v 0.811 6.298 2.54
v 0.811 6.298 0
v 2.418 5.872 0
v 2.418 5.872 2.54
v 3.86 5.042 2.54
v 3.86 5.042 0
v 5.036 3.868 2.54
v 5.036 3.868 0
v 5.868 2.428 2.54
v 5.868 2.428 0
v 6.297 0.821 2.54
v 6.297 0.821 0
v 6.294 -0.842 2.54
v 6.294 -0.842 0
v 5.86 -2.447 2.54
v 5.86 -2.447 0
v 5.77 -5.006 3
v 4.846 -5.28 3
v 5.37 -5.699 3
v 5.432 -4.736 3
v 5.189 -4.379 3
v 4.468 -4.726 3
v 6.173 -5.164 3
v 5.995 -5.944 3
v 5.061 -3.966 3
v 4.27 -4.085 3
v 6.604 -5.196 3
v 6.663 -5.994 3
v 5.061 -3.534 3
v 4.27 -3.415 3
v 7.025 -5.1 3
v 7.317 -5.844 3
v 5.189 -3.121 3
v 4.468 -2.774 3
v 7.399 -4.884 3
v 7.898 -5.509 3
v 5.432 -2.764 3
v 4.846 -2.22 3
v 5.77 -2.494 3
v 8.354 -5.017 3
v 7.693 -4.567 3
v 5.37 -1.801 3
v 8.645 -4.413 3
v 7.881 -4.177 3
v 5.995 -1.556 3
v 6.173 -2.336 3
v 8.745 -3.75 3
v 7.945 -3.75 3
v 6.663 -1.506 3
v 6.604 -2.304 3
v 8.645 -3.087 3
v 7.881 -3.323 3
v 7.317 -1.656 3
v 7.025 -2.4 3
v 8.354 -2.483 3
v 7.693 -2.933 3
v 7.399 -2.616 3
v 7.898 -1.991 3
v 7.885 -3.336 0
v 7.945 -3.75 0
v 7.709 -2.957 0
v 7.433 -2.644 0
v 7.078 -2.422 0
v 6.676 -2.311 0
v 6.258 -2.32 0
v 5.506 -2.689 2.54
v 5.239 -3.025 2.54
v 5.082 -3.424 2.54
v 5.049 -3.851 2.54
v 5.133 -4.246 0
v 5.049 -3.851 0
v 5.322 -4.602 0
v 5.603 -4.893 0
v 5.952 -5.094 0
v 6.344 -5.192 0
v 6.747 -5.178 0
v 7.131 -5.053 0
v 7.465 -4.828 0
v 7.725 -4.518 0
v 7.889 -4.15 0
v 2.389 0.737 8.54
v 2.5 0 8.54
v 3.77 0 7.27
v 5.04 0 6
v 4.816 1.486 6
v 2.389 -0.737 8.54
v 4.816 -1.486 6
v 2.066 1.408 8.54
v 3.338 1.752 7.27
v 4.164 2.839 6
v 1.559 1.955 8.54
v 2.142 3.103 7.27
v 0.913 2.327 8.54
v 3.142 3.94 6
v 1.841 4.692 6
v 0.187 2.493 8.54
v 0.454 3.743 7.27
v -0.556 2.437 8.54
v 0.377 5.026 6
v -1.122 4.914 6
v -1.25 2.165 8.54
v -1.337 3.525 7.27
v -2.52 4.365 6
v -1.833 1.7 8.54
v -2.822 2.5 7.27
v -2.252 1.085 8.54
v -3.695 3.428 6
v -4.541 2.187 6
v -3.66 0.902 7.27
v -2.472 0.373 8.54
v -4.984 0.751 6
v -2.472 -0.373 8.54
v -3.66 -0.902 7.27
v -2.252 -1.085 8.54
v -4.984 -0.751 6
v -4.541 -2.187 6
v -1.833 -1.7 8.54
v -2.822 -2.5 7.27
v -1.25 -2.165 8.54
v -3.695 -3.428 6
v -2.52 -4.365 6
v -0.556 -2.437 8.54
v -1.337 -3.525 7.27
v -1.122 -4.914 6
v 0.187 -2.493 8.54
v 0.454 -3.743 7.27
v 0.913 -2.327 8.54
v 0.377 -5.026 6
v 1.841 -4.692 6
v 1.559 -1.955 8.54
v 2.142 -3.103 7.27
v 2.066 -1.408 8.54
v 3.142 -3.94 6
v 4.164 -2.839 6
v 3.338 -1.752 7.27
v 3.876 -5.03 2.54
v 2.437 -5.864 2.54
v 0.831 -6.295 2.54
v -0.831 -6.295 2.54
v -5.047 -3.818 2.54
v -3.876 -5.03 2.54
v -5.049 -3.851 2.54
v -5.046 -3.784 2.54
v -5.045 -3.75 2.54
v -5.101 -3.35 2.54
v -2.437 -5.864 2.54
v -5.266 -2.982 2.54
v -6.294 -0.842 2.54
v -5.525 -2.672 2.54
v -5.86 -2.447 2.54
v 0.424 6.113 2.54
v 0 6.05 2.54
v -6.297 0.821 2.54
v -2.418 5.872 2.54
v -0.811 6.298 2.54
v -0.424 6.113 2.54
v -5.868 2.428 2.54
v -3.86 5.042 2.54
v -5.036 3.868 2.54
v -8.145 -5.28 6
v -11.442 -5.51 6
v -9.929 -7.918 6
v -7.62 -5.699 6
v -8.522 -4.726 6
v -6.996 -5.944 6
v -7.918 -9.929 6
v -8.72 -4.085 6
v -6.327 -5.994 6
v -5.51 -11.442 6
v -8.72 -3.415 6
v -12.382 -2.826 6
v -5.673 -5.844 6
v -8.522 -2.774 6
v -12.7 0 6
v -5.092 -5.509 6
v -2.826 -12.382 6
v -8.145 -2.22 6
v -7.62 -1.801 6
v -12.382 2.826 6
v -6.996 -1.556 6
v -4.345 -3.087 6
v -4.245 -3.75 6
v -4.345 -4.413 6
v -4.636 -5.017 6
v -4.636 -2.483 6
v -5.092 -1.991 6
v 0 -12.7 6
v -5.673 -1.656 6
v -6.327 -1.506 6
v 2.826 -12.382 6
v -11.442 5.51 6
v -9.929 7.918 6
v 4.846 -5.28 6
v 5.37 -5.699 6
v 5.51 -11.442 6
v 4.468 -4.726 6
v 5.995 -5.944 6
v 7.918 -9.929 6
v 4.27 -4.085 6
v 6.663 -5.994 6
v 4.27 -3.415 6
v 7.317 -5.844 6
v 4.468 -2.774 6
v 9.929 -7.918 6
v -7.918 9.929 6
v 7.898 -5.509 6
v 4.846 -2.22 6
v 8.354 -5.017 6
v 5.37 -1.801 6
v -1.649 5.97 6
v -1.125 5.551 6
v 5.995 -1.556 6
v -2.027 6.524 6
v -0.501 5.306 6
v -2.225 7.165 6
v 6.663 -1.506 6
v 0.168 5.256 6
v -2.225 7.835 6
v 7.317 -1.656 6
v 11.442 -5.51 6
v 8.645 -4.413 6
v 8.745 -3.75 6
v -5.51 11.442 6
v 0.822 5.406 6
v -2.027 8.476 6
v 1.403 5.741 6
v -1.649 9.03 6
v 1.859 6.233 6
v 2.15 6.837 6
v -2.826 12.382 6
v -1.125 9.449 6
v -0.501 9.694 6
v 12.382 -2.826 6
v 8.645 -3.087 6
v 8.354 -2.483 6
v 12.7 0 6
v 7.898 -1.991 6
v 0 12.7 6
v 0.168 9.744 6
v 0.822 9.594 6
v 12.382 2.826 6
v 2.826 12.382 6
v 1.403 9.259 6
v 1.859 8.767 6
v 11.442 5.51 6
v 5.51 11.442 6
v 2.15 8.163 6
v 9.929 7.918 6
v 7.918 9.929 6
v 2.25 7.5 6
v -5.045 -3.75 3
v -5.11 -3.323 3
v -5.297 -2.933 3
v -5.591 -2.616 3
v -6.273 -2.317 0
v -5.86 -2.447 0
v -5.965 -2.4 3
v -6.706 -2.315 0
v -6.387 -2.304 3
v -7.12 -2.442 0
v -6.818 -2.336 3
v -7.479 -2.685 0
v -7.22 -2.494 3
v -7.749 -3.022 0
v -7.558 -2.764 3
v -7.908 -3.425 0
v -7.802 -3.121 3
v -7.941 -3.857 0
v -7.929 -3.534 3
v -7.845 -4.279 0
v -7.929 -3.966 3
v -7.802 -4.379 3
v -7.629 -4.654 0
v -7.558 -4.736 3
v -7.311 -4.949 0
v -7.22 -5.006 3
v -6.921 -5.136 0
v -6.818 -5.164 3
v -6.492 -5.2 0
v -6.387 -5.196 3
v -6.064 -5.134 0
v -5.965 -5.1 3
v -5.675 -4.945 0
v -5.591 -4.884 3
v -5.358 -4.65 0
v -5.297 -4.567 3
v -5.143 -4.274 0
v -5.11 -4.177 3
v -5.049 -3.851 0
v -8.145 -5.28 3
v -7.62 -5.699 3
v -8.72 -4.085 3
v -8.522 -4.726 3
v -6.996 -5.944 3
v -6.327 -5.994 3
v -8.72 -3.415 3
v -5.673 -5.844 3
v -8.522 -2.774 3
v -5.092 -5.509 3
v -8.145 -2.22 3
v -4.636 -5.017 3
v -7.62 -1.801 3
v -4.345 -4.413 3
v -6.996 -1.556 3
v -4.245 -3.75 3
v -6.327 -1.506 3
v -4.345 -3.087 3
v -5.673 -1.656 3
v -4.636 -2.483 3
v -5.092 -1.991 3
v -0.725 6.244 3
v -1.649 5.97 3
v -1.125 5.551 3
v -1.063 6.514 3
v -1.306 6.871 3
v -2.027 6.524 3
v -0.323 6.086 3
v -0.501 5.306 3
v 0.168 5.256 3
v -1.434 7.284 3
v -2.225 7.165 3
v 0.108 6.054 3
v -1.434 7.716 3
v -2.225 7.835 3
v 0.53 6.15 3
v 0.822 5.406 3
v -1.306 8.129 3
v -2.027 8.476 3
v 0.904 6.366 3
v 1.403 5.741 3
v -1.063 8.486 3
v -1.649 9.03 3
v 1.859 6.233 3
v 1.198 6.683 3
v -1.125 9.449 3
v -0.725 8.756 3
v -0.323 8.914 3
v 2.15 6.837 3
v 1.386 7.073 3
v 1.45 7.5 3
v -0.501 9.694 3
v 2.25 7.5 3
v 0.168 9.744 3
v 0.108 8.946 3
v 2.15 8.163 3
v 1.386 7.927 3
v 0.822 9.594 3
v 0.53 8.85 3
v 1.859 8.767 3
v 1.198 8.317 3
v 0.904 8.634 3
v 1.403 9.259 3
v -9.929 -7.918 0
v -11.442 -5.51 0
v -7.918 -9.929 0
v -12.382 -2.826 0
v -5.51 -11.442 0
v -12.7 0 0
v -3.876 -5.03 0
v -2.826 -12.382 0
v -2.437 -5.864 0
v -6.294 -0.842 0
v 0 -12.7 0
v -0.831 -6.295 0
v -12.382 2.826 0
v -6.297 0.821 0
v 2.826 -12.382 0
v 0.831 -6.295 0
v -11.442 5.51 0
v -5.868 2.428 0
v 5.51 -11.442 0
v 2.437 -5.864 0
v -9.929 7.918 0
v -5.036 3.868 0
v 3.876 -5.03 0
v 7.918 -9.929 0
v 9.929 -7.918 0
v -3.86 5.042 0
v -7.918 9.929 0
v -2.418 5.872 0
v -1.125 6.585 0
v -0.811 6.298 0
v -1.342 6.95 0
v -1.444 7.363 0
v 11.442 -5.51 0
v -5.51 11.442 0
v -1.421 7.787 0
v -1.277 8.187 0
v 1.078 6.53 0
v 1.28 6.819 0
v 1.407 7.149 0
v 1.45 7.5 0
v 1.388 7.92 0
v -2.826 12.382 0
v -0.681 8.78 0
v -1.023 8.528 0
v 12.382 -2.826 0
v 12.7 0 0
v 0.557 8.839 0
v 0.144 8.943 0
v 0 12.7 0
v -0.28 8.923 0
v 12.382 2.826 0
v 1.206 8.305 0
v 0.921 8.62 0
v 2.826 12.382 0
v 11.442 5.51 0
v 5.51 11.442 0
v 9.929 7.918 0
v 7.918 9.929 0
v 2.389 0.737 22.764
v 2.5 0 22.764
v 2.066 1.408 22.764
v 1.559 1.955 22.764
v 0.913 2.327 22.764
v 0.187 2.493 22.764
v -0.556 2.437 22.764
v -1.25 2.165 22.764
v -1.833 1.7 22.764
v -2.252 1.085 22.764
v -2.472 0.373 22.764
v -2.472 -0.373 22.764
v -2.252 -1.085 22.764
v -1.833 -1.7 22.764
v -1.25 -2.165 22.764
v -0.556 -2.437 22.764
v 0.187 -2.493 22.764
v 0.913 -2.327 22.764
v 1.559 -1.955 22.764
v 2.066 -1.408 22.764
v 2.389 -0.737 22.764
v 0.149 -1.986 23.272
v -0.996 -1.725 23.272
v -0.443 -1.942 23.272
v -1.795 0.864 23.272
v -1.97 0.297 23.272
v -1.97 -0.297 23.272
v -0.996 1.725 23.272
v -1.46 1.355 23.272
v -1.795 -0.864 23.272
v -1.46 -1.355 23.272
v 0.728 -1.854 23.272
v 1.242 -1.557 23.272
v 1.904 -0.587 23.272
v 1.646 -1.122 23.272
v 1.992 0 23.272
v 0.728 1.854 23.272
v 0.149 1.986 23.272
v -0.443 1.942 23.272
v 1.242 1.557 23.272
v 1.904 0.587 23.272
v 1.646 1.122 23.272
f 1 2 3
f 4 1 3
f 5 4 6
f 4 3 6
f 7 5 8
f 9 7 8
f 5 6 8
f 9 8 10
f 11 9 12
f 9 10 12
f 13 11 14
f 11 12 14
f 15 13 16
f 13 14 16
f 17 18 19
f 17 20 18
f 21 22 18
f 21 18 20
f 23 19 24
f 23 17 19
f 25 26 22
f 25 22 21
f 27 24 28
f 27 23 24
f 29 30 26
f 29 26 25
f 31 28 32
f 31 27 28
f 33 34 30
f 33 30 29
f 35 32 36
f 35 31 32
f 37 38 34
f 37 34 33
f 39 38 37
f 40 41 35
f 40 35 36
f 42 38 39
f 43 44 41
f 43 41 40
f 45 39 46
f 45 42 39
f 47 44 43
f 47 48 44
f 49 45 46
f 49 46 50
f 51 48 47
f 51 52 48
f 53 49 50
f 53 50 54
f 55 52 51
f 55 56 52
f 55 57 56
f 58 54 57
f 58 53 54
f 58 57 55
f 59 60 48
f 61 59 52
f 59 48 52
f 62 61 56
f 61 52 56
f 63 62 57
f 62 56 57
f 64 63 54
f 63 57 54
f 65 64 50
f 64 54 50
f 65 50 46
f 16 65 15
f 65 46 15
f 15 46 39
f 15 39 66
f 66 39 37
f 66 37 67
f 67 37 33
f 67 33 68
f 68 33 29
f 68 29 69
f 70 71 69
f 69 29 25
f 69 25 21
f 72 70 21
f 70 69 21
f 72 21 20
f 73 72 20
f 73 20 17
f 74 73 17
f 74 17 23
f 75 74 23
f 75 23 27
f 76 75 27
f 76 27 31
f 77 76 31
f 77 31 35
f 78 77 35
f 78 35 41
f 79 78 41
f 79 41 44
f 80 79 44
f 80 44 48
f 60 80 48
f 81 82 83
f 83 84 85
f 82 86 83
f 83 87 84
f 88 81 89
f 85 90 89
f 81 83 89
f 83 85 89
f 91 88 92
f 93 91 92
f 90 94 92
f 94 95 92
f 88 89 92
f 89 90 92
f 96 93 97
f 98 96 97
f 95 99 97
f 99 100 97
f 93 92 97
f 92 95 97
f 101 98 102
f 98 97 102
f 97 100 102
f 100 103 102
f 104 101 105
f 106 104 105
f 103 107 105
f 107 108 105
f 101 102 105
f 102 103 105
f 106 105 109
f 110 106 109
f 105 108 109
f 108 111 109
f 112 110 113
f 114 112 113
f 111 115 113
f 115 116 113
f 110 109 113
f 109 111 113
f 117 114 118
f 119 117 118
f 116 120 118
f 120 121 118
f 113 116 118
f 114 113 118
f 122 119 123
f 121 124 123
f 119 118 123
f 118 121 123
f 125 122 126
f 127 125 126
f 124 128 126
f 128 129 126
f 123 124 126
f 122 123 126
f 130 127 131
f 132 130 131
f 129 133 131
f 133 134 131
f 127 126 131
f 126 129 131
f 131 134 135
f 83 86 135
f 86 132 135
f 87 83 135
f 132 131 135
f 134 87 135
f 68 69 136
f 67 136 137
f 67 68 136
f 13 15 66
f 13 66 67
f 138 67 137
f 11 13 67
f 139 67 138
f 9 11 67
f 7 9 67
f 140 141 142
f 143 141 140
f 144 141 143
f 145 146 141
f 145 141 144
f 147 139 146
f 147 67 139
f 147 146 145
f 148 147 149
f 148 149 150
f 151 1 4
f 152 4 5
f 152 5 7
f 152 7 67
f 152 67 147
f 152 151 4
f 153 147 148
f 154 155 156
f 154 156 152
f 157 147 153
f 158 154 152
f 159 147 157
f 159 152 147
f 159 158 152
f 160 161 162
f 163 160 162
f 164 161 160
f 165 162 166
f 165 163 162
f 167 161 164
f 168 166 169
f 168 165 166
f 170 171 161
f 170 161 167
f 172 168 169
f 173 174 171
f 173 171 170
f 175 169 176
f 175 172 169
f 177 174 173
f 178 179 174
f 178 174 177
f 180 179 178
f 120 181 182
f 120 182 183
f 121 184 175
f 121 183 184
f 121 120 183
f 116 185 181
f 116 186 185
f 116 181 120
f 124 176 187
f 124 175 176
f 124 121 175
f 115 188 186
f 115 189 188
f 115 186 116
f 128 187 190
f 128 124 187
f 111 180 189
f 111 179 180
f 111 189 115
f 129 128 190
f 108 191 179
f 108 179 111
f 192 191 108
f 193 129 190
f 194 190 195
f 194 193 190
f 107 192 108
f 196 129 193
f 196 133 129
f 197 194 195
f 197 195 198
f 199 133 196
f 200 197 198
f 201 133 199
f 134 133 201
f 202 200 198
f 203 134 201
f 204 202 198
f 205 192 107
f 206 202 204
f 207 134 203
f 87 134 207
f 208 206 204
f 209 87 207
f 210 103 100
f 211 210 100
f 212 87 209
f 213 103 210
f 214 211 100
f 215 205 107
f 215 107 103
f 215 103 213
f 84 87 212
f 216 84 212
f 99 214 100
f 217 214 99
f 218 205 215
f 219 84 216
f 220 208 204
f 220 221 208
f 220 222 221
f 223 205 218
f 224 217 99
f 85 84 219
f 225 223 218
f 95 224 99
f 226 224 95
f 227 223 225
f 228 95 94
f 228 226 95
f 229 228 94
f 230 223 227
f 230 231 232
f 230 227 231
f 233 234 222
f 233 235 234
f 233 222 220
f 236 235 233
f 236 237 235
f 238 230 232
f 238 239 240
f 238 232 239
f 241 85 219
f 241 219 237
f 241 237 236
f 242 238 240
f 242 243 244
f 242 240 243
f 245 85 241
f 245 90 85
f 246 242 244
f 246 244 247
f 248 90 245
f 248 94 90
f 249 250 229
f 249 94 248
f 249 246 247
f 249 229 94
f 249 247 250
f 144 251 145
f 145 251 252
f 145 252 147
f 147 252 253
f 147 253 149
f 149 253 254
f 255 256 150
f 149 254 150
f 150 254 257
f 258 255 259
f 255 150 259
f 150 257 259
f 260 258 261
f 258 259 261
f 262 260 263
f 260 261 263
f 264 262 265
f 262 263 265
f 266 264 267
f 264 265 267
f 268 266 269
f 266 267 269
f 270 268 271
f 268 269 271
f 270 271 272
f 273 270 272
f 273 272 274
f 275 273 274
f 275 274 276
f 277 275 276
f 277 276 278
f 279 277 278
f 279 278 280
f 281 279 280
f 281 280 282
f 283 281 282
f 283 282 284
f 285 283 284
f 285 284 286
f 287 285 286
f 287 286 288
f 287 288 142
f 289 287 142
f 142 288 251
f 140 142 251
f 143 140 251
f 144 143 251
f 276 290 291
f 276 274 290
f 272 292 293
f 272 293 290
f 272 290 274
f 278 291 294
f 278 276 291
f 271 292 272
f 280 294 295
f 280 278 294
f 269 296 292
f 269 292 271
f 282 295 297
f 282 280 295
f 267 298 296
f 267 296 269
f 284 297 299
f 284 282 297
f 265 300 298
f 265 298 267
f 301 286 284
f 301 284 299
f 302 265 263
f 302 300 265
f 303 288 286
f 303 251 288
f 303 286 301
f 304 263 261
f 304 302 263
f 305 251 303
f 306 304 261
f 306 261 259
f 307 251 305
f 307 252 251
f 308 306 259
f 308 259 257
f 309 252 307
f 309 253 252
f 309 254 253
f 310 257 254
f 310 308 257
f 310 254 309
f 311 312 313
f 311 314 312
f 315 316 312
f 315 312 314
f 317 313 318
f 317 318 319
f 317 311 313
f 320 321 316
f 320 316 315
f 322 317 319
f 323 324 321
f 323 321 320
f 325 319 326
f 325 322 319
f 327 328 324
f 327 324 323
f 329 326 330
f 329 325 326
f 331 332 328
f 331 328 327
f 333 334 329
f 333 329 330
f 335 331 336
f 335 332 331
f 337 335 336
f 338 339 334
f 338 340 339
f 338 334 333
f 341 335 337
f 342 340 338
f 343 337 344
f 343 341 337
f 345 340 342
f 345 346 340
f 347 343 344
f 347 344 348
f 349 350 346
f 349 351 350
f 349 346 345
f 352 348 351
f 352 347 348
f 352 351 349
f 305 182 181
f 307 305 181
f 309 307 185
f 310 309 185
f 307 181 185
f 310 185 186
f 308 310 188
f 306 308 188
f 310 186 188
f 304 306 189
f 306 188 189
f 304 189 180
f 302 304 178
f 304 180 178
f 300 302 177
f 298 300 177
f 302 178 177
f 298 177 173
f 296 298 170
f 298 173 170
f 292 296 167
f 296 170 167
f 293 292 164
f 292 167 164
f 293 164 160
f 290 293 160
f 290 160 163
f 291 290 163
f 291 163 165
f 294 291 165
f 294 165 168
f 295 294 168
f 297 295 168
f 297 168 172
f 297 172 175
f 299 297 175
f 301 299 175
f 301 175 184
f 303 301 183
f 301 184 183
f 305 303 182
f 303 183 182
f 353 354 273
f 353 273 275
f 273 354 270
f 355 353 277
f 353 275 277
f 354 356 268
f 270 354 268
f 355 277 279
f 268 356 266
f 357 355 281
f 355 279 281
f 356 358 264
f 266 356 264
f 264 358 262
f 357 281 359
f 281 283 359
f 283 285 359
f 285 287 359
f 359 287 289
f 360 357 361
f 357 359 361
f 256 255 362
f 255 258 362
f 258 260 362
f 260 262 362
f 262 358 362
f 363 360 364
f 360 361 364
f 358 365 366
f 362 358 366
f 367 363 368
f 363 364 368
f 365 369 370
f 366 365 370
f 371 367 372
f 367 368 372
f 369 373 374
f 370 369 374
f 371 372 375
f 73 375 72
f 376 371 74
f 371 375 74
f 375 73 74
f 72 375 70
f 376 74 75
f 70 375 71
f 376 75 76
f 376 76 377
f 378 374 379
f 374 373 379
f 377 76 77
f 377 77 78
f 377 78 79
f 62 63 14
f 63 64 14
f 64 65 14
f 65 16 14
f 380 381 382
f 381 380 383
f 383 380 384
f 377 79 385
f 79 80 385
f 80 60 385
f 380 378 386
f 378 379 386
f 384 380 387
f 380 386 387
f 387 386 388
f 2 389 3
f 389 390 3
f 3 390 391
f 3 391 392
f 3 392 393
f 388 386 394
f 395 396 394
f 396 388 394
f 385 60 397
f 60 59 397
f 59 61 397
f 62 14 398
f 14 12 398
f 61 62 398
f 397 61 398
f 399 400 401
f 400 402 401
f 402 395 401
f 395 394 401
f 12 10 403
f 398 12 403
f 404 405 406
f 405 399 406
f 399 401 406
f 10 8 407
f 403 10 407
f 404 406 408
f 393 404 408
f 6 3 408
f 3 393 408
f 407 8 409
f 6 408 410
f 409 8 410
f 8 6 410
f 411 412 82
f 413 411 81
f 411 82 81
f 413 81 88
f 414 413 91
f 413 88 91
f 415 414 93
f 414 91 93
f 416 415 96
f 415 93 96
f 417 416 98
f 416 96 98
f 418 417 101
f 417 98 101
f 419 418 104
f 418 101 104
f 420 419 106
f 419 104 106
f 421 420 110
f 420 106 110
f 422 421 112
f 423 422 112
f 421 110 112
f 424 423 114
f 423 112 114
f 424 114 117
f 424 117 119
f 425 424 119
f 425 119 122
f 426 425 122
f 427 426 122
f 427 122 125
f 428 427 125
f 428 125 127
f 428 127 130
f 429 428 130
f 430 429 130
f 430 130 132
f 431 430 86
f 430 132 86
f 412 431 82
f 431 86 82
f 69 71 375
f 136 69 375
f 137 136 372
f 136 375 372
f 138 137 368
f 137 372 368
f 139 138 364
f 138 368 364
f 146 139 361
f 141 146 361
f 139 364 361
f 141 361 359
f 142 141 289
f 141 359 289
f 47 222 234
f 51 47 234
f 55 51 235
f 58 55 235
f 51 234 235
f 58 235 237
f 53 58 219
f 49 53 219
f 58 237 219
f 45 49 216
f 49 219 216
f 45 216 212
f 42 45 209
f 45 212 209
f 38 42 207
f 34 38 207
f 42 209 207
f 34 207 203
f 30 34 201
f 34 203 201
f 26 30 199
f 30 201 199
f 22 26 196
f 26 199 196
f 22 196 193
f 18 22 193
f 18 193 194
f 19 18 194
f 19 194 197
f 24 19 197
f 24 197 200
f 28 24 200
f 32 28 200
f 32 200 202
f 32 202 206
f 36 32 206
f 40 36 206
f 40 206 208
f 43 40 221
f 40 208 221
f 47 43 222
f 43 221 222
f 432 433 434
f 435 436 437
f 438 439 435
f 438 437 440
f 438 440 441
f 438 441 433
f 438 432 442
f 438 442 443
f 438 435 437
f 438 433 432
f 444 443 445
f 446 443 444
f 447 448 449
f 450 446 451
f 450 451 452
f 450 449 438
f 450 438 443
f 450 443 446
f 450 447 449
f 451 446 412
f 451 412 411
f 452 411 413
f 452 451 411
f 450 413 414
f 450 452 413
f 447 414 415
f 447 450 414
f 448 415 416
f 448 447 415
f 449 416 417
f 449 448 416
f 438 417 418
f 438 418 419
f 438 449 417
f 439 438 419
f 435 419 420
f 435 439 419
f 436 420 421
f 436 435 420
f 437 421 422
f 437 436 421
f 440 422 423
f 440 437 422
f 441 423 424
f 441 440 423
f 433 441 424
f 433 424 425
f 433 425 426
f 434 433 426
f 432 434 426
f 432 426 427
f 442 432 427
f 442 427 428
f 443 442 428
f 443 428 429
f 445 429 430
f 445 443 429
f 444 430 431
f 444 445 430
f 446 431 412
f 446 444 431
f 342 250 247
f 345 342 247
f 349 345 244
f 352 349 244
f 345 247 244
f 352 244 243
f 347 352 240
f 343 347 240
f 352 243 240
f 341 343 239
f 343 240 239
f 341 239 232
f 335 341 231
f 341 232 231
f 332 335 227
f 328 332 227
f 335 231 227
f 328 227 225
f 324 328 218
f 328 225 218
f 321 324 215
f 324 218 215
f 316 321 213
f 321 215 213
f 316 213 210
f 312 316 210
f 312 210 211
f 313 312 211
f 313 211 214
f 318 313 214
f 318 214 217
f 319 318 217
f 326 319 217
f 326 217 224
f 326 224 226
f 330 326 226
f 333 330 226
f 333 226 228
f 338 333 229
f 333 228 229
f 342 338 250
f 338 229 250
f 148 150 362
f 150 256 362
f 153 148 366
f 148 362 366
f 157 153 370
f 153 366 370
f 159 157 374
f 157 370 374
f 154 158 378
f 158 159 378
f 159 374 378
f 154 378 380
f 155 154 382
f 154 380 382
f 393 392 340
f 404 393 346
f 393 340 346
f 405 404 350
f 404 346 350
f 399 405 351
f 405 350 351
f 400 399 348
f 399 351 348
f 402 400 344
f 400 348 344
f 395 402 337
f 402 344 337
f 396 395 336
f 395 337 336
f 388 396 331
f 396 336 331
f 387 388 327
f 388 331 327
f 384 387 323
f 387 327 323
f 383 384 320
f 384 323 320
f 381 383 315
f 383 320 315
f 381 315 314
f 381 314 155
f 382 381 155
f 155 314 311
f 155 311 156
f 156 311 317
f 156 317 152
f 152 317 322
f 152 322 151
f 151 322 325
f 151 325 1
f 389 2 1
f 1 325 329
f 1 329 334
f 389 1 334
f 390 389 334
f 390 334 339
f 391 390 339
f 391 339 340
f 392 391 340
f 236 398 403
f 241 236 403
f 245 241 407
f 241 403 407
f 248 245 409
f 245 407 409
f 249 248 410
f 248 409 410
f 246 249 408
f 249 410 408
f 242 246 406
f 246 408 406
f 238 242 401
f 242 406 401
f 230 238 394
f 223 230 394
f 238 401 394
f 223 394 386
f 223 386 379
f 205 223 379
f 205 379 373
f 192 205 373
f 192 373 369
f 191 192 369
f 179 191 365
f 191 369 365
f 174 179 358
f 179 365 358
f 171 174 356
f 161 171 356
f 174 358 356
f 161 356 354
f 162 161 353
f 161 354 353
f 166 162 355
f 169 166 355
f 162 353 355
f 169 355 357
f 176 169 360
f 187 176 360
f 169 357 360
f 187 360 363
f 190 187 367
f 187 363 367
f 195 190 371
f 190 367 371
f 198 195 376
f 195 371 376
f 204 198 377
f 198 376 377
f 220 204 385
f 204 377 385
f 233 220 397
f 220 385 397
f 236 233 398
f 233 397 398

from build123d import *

# Parameters (mm, degrees)
SKETCH1_R                    = 12.7
MOUNTING_FLANGE_DEPTH        = 6
SKETCH3_R                    = 6.35
MOTOR_SHAFT_RELIEF_DEPTH     = 2.54
SKETCH4_R                    = 1.45
SCREW_CLEARANCE_HOLES_DEPTH  = 19.936208702
SKETCH6_R                    = 2.25
SCREW_HEAD_COUNTERBORE_DEPTH = 3
SKETCH2_R                    = 2.5
BOSS_EXTRUDE1_DEPTH          = 17.272
CHAMFER1_SIZE                = 0.508
CHAMFER2_SIZE                = 2.54


with BuildPart() as part:
    # Sketch1 → Mounting Flange (new body)
    with BuildSketch(Plane.XY):
        Circle(SKETCH1_R)
    extrude(amount=MOUNTING_FLANGE_DEPTH)

    # Sketch3 → Motor Shaft Relief (cut)
    with BuildSketch(Plane(origin=(0, 0, 0), x_dir=(-1, 0, 0), z_dir=(0, 0, -1))):
        Circle(SKETCH3_R)
    extrude(amount=-MOTOR_SHAFT_RELIEF_DEPTH, mode=Mode.SUBTRACT)

    # Sketch4 → Screw Clearance Holes (cut, through all)
    with BuildSketch(Plane.XY.offset(6)):
        with Locations((0, 7.5)):
            Circle(SKETCH4_R)
        with Locations((6.495190528, -3.75)):
            Circle(SKETCH4_R)
        with Locations((-6.495190528, -3.75)):
            Circle(SKETCH4_R)
    extrude(amount=-SCREW_CLEARANCE_HOLES_DEPTH, mode=Mode.SUBTRACT)

    # Sketch6 → Screw Head Counterbore (cut)
    with BuildSketch(Plane.XY.offset(6)):
        with Locations((0, 7.5)):
            Circle(SKETCH6_R)
        with Locations((-6.495190528, -3.75)):
            Circle(SKETCH6_R)
        with Locations((6.495190528, -3.75)):
            Circle(SKETCH6_R)
    extrude(amount=-SCREW_HEAD_COUNTERBORE_DEPTH, mode=Mode.SUBTRACT)

    # Sketch2 → Boss-Extrude1 (add)
    with BuildSketch(Plane.XY.offset(6)):
        Circle(SKETCH2_R)
    extrude(amount=BOSS_EXTRUDE1_DEPTH)

    # Chamfer1
    chamfer1_edges = [part.edges().sort_by_distance(p)[0] for p in [
        (-2.5, 0, 23.272),
    ]]
    chamfer(chamfer1_edges, length=CHAMFER1_SIZE)

    # Chamfer2
    chamfer2_edges = [part.edges().sort_by_distance(p)[0] for p in [
        (-2.5, 0, 6),
    ]]
    chamfer(chamfer2_edges, length=CHAMFER2_SIZE)


solid = part.part
